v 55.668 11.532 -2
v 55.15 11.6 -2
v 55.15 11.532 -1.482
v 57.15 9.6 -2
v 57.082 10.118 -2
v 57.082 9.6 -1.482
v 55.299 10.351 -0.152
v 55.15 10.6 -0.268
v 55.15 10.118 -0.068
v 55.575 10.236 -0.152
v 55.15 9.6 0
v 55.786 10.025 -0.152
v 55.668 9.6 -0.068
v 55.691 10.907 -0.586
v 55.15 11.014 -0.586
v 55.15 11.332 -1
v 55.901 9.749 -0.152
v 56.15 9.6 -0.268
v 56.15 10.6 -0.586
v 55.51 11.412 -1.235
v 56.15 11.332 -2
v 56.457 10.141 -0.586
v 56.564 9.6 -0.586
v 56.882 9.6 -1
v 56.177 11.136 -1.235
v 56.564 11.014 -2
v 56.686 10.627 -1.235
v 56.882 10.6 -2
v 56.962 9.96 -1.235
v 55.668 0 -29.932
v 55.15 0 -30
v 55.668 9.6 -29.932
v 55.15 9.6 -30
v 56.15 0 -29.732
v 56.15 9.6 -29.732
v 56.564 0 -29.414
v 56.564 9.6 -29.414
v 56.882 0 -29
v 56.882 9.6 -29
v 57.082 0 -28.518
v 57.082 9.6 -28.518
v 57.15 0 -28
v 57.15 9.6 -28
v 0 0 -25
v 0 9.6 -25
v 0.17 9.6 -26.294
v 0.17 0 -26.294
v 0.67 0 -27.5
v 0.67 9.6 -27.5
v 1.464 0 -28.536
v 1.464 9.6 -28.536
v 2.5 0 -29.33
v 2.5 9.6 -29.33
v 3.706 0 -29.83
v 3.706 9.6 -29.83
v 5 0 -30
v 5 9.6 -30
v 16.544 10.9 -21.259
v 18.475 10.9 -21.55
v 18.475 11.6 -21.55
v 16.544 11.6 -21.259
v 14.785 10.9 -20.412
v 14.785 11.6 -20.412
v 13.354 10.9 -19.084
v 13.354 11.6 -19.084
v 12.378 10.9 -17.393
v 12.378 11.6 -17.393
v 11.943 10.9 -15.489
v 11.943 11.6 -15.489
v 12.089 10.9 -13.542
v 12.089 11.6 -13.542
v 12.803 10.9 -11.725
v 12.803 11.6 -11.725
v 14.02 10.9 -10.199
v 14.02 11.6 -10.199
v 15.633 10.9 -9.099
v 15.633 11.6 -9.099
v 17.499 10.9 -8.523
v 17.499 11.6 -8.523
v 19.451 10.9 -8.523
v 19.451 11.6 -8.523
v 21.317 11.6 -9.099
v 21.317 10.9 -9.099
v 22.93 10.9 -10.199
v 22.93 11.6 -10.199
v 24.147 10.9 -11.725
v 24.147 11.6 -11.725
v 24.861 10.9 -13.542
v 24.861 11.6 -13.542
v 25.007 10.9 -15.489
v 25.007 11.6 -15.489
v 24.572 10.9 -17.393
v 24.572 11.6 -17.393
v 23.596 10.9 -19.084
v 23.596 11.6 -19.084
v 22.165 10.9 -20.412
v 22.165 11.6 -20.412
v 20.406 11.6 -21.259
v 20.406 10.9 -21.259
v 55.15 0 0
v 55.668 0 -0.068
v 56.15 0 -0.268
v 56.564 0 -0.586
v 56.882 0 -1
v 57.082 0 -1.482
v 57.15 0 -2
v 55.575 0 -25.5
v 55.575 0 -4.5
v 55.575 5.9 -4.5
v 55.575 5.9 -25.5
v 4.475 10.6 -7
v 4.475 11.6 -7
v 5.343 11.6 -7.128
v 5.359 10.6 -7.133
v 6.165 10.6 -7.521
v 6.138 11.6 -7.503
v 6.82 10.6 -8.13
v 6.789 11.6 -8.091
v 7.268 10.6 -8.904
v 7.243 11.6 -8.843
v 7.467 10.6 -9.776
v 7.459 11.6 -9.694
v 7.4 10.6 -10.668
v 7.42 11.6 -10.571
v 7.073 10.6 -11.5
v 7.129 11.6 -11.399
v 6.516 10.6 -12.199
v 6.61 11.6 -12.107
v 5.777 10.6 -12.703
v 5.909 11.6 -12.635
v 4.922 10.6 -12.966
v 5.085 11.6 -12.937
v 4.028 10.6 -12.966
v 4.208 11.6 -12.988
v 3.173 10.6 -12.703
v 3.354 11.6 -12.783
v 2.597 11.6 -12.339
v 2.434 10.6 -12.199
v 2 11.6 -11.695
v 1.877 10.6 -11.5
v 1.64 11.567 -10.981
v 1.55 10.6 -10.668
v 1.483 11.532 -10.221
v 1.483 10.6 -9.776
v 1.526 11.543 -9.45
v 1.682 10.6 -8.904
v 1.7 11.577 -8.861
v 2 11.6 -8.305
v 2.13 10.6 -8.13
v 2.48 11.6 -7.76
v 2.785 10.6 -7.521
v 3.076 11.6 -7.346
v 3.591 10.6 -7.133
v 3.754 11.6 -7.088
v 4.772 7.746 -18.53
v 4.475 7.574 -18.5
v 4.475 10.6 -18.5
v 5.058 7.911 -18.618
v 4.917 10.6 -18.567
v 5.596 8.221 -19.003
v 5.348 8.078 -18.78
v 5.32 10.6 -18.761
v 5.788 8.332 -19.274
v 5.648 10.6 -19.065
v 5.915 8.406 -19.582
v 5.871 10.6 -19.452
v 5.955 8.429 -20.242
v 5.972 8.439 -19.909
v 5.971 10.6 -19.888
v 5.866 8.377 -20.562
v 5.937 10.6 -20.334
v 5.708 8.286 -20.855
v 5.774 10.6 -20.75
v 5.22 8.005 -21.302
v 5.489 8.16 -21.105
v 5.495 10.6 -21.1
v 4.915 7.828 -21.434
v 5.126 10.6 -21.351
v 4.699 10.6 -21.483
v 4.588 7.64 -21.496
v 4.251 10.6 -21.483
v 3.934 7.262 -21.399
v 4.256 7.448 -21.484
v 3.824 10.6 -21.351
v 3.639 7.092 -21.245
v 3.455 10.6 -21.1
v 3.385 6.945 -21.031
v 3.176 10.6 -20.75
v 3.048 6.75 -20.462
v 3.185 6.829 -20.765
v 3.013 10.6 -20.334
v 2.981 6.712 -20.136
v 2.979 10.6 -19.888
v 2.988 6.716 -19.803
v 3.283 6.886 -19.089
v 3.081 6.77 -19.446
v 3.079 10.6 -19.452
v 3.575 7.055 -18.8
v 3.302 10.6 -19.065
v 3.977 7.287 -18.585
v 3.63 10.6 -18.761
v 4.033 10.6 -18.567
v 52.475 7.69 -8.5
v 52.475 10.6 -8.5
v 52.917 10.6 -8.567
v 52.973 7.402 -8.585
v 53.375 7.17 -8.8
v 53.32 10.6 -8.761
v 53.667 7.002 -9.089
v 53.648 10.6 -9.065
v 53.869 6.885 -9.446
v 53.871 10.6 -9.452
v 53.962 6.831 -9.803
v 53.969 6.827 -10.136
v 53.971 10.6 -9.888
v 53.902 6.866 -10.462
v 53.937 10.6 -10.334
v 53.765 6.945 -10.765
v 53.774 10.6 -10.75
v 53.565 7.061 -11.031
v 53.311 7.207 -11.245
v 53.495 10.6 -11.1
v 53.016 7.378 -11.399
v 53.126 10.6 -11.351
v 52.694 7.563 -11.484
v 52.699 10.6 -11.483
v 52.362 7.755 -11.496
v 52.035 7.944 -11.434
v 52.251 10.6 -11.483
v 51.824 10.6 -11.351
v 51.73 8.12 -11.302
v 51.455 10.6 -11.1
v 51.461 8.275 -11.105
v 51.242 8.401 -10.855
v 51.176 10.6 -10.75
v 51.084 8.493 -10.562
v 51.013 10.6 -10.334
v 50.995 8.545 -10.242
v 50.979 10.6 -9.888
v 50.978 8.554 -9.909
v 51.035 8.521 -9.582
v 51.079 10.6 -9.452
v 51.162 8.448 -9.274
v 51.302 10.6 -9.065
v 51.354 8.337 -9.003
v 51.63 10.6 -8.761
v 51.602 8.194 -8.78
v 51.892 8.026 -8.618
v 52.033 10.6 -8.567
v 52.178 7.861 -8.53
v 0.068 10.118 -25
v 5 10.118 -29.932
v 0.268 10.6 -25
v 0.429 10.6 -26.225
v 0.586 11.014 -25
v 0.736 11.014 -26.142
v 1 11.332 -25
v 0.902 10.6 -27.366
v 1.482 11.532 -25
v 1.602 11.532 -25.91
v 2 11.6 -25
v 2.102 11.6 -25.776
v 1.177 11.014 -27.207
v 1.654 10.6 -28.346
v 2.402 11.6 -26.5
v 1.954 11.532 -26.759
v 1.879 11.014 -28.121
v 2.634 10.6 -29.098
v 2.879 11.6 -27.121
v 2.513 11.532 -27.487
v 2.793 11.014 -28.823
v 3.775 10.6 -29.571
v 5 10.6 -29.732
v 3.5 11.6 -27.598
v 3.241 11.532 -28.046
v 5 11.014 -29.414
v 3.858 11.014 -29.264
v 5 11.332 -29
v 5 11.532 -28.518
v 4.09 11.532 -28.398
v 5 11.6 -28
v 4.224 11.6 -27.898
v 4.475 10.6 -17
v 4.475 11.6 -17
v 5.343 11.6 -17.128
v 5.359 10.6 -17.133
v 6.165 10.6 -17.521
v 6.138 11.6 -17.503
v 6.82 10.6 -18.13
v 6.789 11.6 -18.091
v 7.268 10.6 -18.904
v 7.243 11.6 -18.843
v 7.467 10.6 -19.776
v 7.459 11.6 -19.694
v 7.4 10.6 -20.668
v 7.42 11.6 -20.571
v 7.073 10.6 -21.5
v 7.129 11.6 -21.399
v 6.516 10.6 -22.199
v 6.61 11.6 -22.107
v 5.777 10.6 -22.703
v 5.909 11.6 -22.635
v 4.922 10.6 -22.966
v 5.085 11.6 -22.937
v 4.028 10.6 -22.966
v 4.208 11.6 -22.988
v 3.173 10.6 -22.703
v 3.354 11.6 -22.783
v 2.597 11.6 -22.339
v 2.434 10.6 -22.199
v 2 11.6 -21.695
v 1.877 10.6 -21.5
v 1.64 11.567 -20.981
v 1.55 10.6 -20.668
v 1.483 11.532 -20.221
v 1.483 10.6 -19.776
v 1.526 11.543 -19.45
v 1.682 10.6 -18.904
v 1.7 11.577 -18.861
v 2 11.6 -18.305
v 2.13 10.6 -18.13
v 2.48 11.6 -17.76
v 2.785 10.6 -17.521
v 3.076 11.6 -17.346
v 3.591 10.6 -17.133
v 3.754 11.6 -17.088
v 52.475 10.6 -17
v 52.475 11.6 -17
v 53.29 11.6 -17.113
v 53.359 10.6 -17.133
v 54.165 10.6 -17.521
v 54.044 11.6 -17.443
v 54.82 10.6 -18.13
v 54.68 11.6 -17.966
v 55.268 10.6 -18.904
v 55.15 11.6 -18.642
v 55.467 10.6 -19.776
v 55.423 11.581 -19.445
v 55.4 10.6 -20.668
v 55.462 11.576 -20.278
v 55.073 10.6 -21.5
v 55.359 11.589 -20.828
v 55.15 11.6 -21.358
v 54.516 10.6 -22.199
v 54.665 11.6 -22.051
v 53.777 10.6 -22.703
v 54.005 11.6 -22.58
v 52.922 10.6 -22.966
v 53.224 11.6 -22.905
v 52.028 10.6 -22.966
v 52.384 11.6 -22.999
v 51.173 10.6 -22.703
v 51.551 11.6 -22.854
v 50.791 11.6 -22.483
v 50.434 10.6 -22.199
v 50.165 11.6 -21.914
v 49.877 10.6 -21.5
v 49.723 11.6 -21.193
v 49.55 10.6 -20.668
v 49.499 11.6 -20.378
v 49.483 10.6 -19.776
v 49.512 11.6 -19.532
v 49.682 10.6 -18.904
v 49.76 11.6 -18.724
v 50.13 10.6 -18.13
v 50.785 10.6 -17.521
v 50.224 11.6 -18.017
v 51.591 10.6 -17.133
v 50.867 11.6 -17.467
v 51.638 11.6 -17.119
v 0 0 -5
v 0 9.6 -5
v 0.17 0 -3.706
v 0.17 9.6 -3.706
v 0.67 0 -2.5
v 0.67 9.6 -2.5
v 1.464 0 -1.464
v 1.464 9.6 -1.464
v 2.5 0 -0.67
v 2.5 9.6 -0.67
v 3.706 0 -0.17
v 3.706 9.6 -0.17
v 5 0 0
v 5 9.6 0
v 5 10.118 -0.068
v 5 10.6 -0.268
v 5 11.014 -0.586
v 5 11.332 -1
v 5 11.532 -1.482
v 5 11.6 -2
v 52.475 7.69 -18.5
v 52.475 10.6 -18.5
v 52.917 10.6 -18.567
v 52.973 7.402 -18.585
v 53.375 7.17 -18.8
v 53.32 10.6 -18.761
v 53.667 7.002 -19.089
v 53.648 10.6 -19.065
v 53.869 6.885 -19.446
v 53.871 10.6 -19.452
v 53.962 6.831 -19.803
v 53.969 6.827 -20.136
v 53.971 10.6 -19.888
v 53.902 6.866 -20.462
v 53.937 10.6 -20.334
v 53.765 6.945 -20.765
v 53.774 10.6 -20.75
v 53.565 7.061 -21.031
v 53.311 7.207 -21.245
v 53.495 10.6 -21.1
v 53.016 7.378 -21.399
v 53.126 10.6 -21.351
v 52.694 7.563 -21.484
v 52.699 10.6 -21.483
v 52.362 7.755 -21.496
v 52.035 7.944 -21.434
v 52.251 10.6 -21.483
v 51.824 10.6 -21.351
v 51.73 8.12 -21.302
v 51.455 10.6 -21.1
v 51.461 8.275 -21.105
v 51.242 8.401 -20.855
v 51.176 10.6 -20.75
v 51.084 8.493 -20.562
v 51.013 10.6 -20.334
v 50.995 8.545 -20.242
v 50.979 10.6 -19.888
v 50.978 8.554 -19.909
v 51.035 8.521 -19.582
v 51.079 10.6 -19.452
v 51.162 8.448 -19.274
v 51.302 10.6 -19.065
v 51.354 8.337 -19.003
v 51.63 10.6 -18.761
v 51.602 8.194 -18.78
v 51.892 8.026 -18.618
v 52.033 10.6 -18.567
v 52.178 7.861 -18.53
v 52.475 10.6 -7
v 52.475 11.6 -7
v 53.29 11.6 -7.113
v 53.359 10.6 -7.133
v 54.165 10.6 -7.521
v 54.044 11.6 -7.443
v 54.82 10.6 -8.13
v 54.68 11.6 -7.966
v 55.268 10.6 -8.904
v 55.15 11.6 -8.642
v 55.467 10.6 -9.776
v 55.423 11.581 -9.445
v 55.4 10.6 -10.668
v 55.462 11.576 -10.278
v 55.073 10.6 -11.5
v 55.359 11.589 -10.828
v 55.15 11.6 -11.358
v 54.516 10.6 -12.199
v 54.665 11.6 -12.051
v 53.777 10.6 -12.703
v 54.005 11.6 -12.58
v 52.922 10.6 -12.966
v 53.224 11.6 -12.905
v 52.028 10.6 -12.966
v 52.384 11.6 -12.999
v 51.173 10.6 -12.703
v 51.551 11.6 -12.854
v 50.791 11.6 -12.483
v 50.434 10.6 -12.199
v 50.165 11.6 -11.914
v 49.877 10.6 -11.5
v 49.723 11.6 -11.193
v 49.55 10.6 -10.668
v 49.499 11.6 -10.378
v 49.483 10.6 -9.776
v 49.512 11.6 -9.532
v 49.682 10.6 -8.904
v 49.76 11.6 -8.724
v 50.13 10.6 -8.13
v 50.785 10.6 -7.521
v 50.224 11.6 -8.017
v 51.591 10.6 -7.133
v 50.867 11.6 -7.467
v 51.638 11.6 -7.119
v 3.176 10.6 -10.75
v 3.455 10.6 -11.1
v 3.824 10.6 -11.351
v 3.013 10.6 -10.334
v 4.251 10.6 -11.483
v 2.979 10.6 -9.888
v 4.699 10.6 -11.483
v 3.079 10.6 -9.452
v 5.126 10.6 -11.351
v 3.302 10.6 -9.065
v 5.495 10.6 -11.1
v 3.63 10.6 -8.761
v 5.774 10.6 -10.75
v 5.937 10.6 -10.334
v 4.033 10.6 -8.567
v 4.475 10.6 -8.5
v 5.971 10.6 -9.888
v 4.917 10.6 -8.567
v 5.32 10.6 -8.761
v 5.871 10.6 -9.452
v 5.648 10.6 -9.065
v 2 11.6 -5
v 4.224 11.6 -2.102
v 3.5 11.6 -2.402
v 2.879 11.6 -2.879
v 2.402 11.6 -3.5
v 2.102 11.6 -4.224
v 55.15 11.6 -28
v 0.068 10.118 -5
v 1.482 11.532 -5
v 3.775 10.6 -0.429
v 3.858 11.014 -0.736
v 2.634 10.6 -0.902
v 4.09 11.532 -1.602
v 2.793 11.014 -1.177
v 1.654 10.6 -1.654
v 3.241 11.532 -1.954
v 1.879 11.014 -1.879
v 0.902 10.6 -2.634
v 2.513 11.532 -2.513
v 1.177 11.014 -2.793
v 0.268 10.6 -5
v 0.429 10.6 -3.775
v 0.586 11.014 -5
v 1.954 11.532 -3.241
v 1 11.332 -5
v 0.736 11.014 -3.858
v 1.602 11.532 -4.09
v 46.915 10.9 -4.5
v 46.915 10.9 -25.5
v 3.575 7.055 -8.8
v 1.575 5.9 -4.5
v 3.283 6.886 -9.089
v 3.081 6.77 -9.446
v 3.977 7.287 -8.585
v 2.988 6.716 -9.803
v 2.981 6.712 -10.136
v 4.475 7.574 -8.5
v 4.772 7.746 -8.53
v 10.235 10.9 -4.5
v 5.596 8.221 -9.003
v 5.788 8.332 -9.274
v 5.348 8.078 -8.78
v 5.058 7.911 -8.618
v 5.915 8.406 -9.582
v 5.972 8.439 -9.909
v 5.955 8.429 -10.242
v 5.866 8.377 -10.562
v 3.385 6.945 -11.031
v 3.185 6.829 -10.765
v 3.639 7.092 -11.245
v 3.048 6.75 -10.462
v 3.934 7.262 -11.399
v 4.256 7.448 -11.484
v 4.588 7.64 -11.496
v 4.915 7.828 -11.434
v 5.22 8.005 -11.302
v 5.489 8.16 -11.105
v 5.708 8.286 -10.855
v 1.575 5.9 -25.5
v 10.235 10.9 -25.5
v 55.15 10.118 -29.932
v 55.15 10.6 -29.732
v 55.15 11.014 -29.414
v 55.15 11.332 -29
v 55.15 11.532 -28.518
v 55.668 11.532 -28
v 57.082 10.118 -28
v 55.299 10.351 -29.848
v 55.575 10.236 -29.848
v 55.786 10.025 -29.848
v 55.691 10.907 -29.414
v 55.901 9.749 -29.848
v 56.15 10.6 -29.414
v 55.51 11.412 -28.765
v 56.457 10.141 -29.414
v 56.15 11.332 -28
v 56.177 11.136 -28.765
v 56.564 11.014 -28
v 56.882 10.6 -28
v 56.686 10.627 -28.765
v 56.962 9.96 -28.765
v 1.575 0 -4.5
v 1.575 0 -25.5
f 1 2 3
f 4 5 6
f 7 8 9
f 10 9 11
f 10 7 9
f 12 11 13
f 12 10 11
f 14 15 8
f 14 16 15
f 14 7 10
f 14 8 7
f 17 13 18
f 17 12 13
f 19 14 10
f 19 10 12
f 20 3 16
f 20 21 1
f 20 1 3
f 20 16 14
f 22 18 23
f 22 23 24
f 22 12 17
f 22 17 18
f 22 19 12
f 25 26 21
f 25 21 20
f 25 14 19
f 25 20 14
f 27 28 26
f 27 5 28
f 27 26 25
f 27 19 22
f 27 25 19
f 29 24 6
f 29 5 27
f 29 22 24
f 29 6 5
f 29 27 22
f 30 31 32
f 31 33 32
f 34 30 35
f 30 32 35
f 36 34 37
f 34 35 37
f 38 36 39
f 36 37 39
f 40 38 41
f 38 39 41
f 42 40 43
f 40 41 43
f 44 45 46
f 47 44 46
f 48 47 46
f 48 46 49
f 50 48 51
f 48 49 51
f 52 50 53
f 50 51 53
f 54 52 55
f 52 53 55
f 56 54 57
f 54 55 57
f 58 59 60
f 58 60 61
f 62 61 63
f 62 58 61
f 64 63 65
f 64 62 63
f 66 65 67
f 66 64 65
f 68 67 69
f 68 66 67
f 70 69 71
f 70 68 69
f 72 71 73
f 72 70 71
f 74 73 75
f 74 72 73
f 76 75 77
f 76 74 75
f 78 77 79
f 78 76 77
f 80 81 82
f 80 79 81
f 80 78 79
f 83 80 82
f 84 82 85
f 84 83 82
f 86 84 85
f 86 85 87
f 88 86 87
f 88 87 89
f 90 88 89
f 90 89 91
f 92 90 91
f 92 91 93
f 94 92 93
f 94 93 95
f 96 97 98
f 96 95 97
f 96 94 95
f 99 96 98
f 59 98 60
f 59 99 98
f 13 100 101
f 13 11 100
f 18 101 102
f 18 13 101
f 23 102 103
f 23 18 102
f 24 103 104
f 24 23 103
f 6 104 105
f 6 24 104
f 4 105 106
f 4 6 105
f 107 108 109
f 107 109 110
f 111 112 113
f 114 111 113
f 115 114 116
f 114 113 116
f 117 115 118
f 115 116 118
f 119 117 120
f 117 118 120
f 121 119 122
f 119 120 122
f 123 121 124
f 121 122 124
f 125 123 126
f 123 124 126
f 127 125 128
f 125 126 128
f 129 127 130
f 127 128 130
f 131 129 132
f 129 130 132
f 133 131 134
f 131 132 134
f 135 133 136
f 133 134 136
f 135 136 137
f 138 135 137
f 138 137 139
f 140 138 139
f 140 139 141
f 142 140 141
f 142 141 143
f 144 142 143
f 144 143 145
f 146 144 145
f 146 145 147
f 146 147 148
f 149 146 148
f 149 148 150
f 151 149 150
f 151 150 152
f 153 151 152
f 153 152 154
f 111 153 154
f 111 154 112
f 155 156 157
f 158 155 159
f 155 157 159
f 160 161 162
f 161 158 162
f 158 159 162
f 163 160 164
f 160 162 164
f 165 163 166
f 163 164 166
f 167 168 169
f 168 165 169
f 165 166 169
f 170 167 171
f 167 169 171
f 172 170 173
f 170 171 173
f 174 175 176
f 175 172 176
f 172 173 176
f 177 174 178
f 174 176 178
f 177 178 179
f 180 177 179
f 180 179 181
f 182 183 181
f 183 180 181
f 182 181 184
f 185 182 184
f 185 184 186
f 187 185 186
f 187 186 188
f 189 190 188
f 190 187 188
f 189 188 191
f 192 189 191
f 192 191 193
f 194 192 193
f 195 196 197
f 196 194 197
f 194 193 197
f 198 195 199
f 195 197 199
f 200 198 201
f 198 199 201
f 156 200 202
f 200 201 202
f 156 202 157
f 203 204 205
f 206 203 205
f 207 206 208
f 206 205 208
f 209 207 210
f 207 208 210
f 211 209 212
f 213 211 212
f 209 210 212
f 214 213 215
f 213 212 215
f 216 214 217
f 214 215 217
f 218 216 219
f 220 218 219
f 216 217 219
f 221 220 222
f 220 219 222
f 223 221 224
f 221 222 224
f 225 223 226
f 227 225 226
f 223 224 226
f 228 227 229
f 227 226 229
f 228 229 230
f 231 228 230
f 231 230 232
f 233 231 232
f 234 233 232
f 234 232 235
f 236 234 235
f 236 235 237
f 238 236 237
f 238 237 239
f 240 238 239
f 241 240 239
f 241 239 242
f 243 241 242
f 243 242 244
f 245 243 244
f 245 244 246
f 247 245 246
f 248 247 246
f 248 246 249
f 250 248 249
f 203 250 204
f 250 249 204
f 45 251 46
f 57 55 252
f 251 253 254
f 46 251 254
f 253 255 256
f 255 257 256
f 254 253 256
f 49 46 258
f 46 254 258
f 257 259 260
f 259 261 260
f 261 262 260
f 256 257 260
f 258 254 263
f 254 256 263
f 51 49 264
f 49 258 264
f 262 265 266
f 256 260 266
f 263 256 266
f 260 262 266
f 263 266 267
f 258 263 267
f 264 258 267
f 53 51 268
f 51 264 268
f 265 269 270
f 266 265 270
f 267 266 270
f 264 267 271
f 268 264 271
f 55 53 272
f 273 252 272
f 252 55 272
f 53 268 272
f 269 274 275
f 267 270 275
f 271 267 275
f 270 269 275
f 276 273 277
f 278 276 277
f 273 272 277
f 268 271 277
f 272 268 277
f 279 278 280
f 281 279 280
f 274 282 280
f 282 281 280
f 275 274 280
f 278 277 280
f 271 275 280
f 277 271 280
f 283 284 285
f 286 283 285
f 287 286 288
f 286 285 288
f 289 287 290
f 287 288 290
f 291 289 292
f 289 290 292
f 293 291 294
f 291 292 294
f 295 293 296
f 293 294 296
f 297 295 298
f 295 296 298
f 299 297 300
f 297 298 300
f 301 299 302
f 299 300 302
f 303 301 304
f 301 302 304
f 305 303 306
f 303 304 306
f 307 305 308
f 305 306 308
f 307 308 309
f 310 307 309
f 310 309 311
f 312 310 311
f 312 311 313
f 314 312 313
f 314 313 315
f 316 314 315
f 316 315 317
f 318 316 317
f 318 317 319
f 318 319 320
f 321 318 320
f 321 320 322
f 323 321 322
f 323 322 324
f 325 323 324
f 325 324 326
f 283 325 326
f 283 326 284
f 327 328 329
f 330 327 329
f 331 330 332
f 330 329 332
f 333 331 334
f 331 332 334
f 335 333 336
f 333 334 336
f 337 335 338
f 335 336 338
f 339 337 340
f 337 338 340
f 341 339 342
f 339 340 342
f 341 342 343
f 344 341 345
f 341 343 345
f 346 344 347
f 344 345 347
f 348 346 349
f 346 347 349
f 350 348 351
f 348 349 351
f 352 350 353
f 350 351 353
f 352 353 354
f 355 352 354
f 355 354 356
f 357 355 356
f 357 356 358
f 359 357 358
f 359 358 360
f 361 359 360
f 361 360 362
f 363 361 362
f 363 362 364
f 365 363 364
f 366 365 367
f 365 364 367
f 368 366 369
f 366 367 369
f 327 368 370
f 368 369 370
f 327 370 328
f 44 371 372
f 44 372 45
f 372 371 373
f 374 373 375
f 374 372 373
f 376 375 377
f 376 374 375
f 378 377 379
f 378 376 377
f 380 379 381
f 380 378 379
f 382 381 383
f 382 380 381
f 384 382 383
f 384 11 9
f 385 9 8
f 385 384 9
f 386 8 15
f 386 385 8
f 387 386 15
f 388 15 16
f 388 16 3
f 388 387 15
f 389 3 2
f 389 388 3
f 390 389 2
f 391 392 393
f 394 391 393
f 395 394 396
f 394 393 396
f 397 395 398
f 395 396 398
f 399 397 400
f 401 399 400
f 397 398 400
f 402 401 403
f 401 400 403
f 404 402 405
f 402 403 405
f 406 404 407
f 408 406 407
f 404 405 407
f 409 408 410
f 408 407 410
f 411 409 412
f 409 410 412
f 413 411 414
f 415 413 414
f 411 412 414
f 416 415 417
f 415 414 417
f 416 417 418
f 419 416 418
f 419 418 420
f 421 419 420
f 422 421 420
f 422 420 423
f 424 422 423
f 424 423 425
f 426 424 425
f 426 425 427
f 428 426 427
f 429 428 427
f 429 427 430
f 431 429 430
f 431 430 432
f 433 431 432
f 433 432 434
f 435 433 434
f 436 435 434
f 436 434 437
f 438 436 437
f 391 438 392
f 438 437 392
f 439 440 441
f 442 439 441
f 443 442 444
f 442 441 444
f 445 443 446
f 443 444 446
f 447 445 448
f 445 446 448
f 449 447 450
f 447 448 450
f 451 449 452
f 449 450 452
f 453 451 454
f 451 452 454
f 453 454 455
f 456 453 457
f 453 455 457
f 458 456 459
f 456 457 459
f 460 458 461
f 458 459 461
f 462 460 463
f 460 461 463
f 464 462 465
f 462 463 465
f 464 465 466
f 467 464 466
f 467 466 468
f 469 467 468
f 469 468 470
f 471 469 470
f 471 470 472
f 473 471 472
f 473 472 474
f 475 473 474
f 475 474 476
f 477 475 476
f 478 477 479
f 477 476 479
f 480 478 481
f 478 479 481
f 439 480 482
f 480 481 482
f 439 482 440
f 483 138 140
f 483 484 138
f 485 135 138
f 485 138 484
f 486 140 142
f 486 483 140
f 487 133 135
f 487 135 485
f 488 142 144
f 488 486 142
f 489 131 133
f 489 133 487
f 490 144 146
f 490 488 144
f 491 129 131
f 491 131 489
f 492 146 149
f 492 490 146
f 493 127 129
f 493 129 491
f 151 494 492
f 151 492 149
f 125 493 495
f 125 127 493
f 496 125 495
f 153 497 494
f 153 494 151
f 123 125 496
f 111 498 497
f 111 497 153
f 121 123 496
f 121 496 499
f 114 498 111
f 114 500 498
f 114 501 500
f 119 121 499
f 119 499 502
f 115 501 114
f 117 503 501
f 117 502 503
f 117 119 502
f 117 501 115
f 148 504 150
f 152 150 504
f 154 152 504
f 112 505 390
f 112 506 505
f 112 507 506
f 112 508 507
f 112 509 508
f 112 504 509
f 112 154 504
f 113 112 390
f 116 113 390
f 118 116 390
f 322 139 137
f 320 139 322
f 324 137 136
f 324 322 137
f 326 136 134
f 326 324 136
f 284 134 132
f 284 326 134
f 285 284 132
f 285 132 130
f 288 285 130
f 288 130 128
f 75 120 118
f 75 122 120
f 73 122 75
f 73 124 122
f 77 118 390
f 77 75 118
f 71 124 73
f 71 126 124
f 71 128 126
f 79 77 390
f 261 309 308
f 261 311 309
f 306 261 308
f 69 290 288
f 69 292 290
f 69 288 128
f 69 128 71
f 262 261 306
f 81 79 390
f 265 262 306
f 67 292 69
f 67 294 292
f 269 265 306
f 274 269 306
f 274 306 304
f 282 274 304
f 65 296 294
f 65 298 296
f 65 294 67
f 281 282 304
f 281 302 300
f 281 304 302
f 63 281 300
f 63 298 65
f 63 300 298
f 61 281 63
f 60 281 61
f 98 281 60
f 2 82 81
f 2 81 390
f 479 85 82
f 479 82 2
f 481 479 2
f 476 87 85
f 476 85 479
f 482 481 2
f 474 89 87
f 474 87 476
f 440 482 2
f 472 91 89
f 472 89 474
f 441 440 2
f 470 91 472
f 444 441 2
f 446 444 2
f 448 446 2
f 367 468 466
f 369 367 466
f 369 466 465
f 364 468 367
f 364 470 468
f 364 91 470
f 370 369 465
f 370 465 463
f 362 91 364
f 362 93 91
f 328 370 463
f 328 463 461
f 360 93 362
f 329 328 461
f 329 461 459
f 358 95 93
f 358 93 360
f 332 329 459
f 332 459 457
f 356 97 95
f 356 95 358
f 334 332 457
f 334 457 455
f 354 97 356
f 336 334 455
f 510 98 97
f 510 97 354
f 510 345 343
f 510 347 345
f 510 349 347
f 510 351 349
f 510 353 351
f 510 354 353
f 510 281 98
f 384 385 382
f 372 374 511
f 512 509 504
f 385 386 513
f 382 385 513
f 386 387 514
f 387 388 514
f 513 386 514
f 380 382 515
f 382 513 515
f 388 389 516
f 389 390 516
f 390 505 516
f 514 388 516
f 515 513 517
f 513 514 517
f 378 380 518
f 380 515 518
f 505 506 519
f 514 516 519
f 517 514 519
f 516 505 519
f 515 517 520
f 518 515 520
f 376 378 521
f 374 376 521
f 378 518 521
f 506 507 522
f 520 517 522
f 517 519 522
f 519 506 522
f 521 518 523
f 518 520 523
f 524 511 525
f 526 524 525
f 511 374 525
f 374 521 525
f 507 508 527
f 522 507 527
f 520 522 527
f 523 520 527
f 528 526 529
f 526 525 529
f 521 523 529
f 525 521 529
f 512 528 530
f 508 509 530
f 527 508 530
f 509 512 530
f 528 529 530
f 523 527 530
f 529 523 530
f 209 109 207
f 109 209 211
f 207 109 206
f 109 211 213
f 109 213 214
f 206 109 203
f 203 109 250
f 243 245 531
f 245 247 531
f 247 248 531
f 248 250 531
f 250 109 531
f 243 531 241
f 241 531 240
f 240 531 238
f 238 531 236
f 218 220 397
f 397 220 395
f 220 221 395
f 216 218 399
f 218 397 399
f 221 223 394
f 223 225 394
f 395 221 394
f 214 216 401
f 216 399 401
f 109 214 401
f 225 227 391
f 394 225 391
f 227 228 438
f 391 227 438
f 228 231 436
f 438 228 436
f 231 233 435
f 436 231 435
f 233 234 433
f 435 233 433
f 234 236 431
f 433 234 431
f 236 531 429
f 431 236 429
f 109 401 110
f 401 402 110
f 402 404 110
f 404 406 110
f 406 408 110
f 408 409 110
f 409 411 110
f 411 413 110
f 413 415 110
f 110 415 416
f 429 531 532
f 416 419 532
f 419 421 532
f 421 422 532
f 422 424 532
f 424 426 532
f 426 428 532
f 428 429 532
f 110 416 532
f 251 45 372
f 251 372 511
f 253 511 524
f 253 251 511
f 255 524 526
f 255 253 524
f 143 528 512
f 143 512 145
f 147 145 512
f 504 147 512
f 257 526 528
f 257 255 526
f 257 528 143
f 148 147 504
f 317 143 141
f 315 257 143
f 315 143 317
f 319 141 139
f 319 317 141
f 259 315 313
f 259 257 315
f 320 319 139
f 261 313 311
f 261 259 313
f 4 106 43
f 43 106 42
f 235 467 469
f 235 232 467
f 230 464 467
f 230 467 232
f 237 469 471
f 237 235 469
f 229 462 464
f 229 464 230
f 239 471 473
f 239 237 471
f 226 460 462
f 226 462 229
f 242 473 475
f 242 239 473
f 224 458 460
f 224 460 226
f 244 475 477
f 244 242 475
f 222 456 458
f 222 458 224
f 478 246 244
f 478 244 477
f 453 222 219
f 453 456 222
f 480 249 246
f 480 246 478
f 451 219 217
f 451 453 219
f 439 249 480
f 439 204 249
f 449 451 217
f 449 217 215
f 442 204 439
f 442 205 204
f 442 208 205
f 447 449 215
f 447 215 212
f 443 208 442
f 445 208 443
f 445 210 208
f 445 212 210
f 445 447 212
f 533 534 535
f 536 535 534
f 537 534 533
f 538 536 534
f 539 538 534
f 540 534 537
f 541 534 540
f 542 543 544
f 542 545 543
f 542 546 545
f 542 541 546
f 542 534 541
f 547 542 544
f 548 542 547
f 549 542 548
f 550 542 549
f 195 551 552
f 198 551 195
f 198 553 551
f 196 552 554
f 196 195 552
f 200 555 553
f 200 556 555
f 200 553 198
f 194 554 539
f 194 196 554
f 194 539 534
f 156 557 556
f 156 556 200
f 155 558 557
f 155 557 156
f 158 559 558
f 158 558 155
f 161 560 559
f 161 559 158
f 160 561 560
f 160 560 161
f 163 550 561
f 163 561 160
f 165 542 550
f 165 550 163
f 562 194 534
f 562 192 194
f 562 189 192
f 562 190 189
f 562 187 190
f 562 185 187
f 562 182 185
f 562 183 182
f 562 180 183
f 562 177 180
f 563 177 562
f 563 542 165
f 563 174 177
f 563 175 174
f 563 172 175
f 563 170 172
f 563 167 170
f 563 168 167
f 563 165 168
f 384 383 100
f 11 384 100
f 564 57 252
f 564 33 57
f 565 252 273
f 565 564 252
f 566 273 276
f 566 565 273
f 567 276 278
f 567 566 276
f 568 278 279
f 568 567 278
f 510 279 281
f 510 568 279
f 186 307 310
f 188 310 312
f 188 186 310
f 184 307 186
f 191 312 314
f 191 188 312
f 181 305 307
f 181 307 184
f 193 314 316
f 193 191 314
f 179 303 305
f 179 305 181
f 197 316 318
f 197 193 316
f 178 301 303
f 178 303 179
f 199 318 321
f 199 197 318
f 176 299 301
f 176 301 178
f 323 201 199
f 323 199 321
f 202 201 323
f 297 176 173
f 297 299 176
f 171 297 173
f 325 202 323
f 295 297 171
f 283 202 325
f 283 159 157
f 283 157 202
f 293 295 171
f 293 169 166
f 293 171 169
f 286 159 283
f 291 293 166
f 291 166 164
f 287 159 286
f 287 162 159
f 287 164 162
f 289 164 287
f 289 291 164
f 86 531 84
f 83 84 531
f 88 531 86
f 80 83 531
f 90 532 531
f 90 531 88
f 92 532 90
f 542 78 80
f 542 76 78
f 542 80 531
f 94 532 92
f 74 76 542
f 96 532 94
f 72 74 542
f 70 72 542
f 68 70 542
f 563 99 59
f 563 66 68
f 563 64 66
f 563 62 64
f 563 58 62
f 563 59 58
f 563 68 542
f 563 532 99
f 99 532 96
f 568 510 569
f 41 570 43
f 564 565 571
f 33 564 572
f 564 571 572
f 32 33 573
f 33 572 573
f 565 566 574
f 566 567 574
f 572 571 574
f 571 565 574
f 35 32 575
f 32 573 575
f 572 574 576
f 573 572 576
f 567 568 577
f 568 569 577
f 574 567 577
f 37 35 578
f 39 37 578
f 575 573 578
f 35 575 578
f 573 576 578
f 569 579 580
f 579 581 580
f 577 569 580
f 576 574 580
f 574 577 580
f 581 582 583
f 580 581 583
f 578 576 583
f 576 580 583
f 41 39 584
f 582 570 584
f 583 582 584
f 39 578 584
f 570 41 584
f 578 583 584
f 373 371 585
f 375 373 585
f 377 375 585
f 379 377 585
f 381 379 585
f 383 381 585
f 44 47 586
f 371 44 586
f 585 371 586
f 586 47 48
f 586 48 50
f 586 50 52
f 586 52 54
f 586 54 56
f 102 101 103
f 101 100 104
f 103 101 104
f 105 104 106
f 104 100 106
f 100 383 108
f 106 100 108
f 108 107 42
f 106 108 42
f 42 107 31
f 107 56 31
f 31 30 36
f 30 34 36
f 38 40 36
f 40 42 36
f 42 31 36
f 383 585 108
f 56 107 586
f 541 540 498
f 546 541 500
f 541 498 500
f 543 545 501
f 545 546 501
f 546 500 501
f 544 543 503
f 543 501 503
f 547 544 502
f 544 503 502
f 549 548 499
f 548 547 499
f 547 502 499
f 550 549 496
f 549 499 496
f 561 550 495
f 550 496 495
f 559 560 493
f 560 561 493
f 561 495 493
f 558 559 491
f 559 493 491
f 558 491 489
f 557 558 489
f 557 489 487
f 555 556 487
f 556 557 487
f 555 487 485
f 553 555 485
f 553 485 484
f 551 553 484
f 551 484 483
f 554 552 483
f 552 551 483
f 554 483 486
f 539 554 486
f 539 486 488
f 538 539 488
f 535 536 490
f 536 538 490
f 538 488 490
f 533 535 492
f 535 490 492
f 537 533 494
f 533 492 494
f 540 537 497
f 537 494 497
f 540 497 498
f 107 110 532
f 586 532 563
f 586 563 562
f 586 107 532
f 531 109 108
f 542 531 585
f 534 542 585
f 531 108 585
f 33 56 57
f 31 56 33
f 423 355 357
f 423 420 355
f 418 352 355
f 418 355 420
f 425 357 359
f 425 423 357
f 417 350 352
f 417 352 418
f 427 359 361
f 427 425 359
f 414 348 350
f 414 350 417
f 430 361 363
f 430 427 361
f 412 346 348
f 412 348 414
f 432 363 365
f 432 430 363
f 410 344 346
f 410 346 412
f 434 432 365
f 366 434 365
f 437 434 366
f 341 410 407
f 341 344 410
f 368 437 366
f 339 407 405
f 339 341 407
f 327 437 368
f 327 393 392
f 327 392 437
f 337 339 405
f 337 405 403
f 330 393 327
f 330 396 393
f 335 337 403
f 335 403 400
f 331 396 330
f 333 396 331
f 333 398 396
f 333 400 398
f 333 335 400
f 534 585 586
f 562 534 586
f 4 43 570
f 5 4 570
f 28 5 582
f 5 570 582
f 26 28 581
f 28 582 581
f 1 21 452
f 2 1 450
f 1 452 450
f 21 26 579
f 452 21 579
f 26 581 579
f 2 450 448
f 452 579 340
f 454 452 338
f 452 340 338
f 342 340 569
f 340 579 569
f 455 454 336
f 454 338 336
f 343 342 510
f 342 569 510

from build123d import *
from OCP.BRepFilletAPI import BRepFilletAPI_MakeChamfer

# Parameters (mm, degrees)
SKETCH1_W               = 57.15
SKETCH1_H               = 30
BOSS_EXTRUDE1_DEPTH     = 11.6
SKETCH2_W               = 54
SKETCH2_H               = 21
CUT_EXTRUDE1_DEPTH      = 10.9
SKETCH3_R               = 5.375
CUT_EXTRUDE2_DEPTH      = 0.65
FILLET1_R               = 5
CUT_EXTRUDE3_DEPTH      = 66.467740147
CUT_EXTRUDE3_DEPTH_BACK = 1.35
SKETCH5_R               = 6.55
CHAMFER1_SIZE           = 5
CHAMFER1_SIZE2          = 8.660254038
FILLET2_R               = 2
SKETCH8_R               = 1.5
CUT_EXTRUDE5_DEPTH      = 10
SKETCH9_R               = 3
CUT_EXTRUDE6_DEPTH      = 1


with BuildPart() as part:
    # Sketch1 → Boss-Extrude1 (new body)
    with BuildSketch(Plane(origin=(0, 0, 0), x_dir=(1, 0, 0), z_dir=(0, 1, 0))):
        with Locations((28.575, 15)):
            Rectangle(SKETCH1_W, SKETCH1_H)
    extrude(amount=BOSS_EXTRUDE1_DEPTH)

    # Sketch2 → Cut-Extrude1 (cut)
    with BuildSketch(Plane(origin=(0, 0, 0), x_dir=(-1, 0, 0), z_dir=(0, -1, 0))):
        with Locations((-28.575, 15)):
            Rectangle(SKETCH2_W, SKETCH2_H)
    extrude(amount=-CUT_EXTRUDE1_DEPTH, mode=Mode.SUBTRACT)

    # Sketch3 → Cut-Extrude2 (cut)
    with BuildSketch(Plane(origin=(0, 11.6, 0), x_dir=(1, 0, 0), z_dir=(0, 1, 0))):
        with Locations(Location((17.58, 15, 0), (0, 0, 270))):
            Circle(SKETCH3_R)
    extrude(amount=-CUT_EXTRUDE2_DEPTH, mode=Mode.SUBTRACT)

    # Fillet1
    fillet1_edges = [part.edges().sort_by_distance(p)[0] for p in [
        (0, 5.8, -30),
        (0, 5.8, 0),
    ]]
    fillet(fillet1_edges, radius=FILLET1_R)

    # Sketch5 → Cut-Extrude3 (cut, two sides: drawn at the far end of the back side and taken through both)
    with BuildSketch(Plane(origin=(0, 10.95, 0), x_dir=(1, 0, 0), z_dir=(0, 1, 0)).offset(-CUT_EXTRUDE3_DEPTH_BACK)):
        with Locations(Location((18.475, 15, 0), (0, 0, 90))):
            Circle(SKETCH5_R)
    extrude(amount=CUT_EXTRUDE3_DEPTH + CUT_EXTRUDE3_DEPTH_BACK, mode=Mode.SUBTRACT)

    # Chamfer1: one chamfer whose edges measure the first distance from different faces: ONE call of the kernel's chamfer builder (chamfer() names one face for all edges)
    chamfer1_edges_1 = [part.edges().sort_by_distance(p)[0] for p in [
        (1.575, 10.9, -15),
    ]]
    chamfer1_side_1 = [part.faces().sort_by_distance(p)[0] for p in [
        (1.575, 5.45, -15),
    ]]
    chamfer1_edges_2 = [part.edges().sort_by_distance(p)[0] for p in [
        (55.575, 10.9, -15),
    ]]
    chamfer1_side_2 = [part.faces().sort_by_distance(p)[0] for p in [
        (55.575, 5.45, -15),
    ]]
    chamfer1 = BRepFilletAPI_MakeChamfer(part.part.solid().wrapped)
    for e in chamfer1_edges_1:
        chamfer1.Add(CHAMFER1_SIZE, CHAMFER1_SIZE2, e.wrapped, chamfer1_side_1[0].wrapped)  # the first distance lies on this face
    for e in chamfer1_edges_2:
        chamfer1.Add(CHAMFER1_SIZE, CHAMFER1_SIZE2, e.wrapped, chamfer1_side_2[0].wrapped)  # the first distance lies on this face
    add(Compound.cast(chamfer1.Shape()), mode=Mode.REPLACE)

    # Fillet2
    fillet2_edges = [part.edges().sort_by_distance(p)[0] for p in [
        (57.15, 11.6, -15),
        (31.075, 11.6, -30),
        (0, 11.6, -15),
        (31.075, 11.6, 0),
        (1.464466094, 11.6, -1.464466094),
        (1.464466094, 11.6, -28.535533906),
        (57.15, 5.8, -30),
        (57.15, 5.8, 0),
    ]]
    fillet(fillet2_edges, radius=FILLET2_R)

    # Sketch8 → Cut-Extrude5 (cut)
    with BuildSketch(Plane(origin=(0, 11.6, 0), x_dir=(1, 0, 0), z_dir=(0, 1, 0))):
        with Locations(Location((52.475, 20, 0), (0, 0, 270))):
            Circle(SKETCH8_R)
        with Locations(Location((52.475, 10, 0), (0, 0, 270))):
            Circle(SKETCH8_R)
        with Locations(Location((4.475, 20, 0), (0, 0, 270))):
            Circle(SKETCH8_R)
        with Locations(Location((4.475, 10, 0), (0, 0, 270))):
            Circle(SKETCH8_R)
    extrude(amount=-CUT_EXTRUDE5_DEPTH, mode=Mode.SUBTRACT)

    # Sketch9 → Cut-Extrude6 (cut)
    with BuildSketch(Plane(origin=(0, 11.6, 0), x_dir=(1, 0, 0), z_dir=(0, 1, 0))):
        with Locations(Location((4.475, 20, 0), (0, 0, 270))):
            Circle(SKETCH9_R)
        with Locations(Location((4.475, 10, 0), (0, 0, 270))):
            Circle(SKETCH9_R)
        with Locations(Location((52.475, 10, 0), (0, 0, 270))):
            Circle(SKETCH9_R)
        with Locations(Location((52.475, 20, 0), (0, 0, 270))):
            Circle(SKETCH9_R)
    extrude(amount=-CUT_EXTRUDE6_DEPTH, mode=Mode.SUBTRACT)


solid = part.part
